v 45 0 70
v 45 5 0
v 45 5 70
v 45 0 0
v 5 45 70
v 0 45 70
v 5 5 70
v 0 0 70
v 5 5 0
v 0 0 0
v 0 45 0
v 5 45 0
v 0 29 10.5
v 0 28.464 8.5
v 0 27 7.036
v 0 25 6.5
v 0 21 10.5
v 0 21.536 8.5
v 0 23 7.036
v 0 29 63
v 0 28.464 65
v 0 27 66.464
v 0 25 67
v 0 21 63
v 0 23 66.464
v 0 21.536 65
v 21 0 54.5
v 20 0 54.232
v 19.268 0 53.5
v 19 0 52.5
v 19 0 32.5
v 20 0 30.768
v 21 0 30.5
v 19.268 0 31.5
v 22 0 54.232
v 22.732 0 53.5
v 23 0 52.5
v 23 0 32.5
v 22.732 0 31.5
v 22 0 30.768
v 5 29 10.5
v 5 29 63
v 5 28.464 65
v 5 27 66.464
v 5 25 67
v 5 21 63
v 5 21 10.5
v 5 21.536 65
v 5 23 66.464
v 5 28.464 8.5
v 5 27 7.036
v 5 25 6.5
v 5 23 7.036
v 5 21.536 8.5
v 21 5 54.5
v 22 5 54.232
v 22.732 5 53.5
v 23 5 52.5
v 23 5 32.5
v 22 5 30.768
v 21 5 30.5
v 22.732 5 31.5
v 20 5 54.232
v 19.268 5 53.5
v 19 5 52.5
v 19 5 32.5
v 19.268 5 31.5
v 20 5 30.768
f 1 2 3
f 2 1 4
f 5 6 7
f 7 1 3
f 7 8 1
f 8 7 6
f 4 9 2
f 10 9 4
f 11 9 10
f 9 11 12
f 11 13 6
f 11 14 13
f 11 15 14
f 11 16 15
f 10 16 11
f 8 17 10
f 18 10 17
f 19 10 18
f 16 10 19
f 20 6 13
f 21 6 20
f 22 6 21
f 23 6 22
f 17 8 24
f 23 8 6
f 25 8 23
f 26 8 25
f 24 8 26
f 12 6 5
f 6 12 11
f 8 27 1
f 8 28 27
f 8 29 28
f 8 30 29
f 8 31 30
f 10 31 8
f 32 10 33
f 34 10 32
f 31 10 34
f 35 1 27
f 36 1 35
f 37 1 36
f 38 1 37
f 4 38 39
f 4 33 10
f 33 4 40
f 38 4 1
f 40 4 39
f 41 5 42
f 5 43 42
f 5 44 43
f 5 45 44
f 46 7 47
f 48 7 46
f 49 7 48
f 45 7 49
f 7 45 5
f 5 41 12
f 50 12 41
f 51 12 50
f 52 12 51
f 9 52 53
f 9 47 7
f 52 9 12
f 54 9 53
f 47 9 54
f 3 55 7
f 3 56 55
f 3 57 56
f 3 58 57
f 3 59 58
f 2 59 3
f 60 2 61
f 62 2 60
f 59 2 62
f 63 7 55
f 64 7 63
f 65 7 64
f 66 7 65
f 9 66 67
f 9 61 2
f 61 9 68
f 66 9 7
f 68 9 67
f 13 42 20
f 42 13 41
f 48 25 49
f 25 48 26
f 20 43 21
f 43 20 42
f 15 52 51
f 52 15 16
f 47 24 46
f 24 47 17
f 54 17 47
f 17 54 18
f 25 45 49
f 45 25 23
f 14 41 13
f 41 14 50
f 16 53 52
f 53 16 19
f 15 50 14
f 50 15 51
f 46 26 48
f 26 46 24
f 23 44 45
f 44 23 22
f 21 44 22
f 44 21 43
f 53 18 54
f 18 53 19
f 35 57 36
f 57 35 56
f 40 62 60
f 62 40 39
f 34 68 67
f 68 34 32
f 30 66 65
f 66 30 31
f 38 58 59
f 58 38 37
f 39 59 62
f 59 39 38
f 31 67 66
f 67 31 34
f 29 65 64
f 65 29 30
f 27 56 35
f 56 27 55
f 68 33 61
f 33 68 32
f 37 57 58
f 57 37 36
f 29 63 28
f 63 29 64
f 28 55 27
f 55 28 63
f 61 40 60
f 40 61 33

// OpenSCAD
$fn=12;
mount_edge = 45;
laser_edge = 40;
gantry_mount_hole=4;
laser_mount_hole=8;
mount_height = 70;
mount_thickness = 5;

module mount_cube ( ) { 
    cube(
    [mount_edge,
    mount_edge,
    mount_height,
    ],
    center=false);
}

difference()
{
translate( v = [0,
                0,
                0] ) {
    mount_cube();
}
translate( v = [mount_thickness,
                    mount_thickness,
                    0] ) {
                        color("red") {

        mount_cube();
    }
}



translate([0,mount_edge-laser_edge/2,mount_height*.9]) {
    color("red")
    rotate([0,90,0]) {
        hull() {
            translate([mount_height*.75,0,0]) 
                cylinder(h=mount_thickness,d=laser_mount_hole,center=false);
            cylinder(h=mount_thickness,d=laser_mount_hole,center=false);
        }
    }
}


translate([mount_edge-laser_edge/2-gantry_mount_hole
, 0,mount_height*.75]) {
    color("blue")
    rotate([0,90,90]) {
        hull() {
            translate([20,0,0]) 
                cylinder(h=mount_thickness,d=gantry_mount_hole,center=false);
            cylinder(h=mount_thickness,d=gantry_mount_hole,center=false);
        }
    }
}
}
/*
translate( v = [0,
                0,
                0] ) {
    cube(2
        [pillars,
        pillars,
        edge,
        ],
        center=false);
}

translate( v = [edge - pillars,
                edge - pillars,
                0] ) {
    cube(
        [pillars,
        pillars,
        edge,
        ],
        center=false);
}

translate( v = [0,
                edge - pillars,
                0] ) {
    cube(
        [pillars,
        pillars,
        edge,
        ],
        center=false);
}

translate( v = [edge - pillars,
                0,
                0] ) {
    cube(
        [pillars,
        pillars,
        edge,
        ],
        center=false);
}

// Top
translate( v = [0,
                0, 
                edge - pillars] ) {
    cube(
        [edge,
        edge,
        pillars,
        ],
        center=false);
}
*/
